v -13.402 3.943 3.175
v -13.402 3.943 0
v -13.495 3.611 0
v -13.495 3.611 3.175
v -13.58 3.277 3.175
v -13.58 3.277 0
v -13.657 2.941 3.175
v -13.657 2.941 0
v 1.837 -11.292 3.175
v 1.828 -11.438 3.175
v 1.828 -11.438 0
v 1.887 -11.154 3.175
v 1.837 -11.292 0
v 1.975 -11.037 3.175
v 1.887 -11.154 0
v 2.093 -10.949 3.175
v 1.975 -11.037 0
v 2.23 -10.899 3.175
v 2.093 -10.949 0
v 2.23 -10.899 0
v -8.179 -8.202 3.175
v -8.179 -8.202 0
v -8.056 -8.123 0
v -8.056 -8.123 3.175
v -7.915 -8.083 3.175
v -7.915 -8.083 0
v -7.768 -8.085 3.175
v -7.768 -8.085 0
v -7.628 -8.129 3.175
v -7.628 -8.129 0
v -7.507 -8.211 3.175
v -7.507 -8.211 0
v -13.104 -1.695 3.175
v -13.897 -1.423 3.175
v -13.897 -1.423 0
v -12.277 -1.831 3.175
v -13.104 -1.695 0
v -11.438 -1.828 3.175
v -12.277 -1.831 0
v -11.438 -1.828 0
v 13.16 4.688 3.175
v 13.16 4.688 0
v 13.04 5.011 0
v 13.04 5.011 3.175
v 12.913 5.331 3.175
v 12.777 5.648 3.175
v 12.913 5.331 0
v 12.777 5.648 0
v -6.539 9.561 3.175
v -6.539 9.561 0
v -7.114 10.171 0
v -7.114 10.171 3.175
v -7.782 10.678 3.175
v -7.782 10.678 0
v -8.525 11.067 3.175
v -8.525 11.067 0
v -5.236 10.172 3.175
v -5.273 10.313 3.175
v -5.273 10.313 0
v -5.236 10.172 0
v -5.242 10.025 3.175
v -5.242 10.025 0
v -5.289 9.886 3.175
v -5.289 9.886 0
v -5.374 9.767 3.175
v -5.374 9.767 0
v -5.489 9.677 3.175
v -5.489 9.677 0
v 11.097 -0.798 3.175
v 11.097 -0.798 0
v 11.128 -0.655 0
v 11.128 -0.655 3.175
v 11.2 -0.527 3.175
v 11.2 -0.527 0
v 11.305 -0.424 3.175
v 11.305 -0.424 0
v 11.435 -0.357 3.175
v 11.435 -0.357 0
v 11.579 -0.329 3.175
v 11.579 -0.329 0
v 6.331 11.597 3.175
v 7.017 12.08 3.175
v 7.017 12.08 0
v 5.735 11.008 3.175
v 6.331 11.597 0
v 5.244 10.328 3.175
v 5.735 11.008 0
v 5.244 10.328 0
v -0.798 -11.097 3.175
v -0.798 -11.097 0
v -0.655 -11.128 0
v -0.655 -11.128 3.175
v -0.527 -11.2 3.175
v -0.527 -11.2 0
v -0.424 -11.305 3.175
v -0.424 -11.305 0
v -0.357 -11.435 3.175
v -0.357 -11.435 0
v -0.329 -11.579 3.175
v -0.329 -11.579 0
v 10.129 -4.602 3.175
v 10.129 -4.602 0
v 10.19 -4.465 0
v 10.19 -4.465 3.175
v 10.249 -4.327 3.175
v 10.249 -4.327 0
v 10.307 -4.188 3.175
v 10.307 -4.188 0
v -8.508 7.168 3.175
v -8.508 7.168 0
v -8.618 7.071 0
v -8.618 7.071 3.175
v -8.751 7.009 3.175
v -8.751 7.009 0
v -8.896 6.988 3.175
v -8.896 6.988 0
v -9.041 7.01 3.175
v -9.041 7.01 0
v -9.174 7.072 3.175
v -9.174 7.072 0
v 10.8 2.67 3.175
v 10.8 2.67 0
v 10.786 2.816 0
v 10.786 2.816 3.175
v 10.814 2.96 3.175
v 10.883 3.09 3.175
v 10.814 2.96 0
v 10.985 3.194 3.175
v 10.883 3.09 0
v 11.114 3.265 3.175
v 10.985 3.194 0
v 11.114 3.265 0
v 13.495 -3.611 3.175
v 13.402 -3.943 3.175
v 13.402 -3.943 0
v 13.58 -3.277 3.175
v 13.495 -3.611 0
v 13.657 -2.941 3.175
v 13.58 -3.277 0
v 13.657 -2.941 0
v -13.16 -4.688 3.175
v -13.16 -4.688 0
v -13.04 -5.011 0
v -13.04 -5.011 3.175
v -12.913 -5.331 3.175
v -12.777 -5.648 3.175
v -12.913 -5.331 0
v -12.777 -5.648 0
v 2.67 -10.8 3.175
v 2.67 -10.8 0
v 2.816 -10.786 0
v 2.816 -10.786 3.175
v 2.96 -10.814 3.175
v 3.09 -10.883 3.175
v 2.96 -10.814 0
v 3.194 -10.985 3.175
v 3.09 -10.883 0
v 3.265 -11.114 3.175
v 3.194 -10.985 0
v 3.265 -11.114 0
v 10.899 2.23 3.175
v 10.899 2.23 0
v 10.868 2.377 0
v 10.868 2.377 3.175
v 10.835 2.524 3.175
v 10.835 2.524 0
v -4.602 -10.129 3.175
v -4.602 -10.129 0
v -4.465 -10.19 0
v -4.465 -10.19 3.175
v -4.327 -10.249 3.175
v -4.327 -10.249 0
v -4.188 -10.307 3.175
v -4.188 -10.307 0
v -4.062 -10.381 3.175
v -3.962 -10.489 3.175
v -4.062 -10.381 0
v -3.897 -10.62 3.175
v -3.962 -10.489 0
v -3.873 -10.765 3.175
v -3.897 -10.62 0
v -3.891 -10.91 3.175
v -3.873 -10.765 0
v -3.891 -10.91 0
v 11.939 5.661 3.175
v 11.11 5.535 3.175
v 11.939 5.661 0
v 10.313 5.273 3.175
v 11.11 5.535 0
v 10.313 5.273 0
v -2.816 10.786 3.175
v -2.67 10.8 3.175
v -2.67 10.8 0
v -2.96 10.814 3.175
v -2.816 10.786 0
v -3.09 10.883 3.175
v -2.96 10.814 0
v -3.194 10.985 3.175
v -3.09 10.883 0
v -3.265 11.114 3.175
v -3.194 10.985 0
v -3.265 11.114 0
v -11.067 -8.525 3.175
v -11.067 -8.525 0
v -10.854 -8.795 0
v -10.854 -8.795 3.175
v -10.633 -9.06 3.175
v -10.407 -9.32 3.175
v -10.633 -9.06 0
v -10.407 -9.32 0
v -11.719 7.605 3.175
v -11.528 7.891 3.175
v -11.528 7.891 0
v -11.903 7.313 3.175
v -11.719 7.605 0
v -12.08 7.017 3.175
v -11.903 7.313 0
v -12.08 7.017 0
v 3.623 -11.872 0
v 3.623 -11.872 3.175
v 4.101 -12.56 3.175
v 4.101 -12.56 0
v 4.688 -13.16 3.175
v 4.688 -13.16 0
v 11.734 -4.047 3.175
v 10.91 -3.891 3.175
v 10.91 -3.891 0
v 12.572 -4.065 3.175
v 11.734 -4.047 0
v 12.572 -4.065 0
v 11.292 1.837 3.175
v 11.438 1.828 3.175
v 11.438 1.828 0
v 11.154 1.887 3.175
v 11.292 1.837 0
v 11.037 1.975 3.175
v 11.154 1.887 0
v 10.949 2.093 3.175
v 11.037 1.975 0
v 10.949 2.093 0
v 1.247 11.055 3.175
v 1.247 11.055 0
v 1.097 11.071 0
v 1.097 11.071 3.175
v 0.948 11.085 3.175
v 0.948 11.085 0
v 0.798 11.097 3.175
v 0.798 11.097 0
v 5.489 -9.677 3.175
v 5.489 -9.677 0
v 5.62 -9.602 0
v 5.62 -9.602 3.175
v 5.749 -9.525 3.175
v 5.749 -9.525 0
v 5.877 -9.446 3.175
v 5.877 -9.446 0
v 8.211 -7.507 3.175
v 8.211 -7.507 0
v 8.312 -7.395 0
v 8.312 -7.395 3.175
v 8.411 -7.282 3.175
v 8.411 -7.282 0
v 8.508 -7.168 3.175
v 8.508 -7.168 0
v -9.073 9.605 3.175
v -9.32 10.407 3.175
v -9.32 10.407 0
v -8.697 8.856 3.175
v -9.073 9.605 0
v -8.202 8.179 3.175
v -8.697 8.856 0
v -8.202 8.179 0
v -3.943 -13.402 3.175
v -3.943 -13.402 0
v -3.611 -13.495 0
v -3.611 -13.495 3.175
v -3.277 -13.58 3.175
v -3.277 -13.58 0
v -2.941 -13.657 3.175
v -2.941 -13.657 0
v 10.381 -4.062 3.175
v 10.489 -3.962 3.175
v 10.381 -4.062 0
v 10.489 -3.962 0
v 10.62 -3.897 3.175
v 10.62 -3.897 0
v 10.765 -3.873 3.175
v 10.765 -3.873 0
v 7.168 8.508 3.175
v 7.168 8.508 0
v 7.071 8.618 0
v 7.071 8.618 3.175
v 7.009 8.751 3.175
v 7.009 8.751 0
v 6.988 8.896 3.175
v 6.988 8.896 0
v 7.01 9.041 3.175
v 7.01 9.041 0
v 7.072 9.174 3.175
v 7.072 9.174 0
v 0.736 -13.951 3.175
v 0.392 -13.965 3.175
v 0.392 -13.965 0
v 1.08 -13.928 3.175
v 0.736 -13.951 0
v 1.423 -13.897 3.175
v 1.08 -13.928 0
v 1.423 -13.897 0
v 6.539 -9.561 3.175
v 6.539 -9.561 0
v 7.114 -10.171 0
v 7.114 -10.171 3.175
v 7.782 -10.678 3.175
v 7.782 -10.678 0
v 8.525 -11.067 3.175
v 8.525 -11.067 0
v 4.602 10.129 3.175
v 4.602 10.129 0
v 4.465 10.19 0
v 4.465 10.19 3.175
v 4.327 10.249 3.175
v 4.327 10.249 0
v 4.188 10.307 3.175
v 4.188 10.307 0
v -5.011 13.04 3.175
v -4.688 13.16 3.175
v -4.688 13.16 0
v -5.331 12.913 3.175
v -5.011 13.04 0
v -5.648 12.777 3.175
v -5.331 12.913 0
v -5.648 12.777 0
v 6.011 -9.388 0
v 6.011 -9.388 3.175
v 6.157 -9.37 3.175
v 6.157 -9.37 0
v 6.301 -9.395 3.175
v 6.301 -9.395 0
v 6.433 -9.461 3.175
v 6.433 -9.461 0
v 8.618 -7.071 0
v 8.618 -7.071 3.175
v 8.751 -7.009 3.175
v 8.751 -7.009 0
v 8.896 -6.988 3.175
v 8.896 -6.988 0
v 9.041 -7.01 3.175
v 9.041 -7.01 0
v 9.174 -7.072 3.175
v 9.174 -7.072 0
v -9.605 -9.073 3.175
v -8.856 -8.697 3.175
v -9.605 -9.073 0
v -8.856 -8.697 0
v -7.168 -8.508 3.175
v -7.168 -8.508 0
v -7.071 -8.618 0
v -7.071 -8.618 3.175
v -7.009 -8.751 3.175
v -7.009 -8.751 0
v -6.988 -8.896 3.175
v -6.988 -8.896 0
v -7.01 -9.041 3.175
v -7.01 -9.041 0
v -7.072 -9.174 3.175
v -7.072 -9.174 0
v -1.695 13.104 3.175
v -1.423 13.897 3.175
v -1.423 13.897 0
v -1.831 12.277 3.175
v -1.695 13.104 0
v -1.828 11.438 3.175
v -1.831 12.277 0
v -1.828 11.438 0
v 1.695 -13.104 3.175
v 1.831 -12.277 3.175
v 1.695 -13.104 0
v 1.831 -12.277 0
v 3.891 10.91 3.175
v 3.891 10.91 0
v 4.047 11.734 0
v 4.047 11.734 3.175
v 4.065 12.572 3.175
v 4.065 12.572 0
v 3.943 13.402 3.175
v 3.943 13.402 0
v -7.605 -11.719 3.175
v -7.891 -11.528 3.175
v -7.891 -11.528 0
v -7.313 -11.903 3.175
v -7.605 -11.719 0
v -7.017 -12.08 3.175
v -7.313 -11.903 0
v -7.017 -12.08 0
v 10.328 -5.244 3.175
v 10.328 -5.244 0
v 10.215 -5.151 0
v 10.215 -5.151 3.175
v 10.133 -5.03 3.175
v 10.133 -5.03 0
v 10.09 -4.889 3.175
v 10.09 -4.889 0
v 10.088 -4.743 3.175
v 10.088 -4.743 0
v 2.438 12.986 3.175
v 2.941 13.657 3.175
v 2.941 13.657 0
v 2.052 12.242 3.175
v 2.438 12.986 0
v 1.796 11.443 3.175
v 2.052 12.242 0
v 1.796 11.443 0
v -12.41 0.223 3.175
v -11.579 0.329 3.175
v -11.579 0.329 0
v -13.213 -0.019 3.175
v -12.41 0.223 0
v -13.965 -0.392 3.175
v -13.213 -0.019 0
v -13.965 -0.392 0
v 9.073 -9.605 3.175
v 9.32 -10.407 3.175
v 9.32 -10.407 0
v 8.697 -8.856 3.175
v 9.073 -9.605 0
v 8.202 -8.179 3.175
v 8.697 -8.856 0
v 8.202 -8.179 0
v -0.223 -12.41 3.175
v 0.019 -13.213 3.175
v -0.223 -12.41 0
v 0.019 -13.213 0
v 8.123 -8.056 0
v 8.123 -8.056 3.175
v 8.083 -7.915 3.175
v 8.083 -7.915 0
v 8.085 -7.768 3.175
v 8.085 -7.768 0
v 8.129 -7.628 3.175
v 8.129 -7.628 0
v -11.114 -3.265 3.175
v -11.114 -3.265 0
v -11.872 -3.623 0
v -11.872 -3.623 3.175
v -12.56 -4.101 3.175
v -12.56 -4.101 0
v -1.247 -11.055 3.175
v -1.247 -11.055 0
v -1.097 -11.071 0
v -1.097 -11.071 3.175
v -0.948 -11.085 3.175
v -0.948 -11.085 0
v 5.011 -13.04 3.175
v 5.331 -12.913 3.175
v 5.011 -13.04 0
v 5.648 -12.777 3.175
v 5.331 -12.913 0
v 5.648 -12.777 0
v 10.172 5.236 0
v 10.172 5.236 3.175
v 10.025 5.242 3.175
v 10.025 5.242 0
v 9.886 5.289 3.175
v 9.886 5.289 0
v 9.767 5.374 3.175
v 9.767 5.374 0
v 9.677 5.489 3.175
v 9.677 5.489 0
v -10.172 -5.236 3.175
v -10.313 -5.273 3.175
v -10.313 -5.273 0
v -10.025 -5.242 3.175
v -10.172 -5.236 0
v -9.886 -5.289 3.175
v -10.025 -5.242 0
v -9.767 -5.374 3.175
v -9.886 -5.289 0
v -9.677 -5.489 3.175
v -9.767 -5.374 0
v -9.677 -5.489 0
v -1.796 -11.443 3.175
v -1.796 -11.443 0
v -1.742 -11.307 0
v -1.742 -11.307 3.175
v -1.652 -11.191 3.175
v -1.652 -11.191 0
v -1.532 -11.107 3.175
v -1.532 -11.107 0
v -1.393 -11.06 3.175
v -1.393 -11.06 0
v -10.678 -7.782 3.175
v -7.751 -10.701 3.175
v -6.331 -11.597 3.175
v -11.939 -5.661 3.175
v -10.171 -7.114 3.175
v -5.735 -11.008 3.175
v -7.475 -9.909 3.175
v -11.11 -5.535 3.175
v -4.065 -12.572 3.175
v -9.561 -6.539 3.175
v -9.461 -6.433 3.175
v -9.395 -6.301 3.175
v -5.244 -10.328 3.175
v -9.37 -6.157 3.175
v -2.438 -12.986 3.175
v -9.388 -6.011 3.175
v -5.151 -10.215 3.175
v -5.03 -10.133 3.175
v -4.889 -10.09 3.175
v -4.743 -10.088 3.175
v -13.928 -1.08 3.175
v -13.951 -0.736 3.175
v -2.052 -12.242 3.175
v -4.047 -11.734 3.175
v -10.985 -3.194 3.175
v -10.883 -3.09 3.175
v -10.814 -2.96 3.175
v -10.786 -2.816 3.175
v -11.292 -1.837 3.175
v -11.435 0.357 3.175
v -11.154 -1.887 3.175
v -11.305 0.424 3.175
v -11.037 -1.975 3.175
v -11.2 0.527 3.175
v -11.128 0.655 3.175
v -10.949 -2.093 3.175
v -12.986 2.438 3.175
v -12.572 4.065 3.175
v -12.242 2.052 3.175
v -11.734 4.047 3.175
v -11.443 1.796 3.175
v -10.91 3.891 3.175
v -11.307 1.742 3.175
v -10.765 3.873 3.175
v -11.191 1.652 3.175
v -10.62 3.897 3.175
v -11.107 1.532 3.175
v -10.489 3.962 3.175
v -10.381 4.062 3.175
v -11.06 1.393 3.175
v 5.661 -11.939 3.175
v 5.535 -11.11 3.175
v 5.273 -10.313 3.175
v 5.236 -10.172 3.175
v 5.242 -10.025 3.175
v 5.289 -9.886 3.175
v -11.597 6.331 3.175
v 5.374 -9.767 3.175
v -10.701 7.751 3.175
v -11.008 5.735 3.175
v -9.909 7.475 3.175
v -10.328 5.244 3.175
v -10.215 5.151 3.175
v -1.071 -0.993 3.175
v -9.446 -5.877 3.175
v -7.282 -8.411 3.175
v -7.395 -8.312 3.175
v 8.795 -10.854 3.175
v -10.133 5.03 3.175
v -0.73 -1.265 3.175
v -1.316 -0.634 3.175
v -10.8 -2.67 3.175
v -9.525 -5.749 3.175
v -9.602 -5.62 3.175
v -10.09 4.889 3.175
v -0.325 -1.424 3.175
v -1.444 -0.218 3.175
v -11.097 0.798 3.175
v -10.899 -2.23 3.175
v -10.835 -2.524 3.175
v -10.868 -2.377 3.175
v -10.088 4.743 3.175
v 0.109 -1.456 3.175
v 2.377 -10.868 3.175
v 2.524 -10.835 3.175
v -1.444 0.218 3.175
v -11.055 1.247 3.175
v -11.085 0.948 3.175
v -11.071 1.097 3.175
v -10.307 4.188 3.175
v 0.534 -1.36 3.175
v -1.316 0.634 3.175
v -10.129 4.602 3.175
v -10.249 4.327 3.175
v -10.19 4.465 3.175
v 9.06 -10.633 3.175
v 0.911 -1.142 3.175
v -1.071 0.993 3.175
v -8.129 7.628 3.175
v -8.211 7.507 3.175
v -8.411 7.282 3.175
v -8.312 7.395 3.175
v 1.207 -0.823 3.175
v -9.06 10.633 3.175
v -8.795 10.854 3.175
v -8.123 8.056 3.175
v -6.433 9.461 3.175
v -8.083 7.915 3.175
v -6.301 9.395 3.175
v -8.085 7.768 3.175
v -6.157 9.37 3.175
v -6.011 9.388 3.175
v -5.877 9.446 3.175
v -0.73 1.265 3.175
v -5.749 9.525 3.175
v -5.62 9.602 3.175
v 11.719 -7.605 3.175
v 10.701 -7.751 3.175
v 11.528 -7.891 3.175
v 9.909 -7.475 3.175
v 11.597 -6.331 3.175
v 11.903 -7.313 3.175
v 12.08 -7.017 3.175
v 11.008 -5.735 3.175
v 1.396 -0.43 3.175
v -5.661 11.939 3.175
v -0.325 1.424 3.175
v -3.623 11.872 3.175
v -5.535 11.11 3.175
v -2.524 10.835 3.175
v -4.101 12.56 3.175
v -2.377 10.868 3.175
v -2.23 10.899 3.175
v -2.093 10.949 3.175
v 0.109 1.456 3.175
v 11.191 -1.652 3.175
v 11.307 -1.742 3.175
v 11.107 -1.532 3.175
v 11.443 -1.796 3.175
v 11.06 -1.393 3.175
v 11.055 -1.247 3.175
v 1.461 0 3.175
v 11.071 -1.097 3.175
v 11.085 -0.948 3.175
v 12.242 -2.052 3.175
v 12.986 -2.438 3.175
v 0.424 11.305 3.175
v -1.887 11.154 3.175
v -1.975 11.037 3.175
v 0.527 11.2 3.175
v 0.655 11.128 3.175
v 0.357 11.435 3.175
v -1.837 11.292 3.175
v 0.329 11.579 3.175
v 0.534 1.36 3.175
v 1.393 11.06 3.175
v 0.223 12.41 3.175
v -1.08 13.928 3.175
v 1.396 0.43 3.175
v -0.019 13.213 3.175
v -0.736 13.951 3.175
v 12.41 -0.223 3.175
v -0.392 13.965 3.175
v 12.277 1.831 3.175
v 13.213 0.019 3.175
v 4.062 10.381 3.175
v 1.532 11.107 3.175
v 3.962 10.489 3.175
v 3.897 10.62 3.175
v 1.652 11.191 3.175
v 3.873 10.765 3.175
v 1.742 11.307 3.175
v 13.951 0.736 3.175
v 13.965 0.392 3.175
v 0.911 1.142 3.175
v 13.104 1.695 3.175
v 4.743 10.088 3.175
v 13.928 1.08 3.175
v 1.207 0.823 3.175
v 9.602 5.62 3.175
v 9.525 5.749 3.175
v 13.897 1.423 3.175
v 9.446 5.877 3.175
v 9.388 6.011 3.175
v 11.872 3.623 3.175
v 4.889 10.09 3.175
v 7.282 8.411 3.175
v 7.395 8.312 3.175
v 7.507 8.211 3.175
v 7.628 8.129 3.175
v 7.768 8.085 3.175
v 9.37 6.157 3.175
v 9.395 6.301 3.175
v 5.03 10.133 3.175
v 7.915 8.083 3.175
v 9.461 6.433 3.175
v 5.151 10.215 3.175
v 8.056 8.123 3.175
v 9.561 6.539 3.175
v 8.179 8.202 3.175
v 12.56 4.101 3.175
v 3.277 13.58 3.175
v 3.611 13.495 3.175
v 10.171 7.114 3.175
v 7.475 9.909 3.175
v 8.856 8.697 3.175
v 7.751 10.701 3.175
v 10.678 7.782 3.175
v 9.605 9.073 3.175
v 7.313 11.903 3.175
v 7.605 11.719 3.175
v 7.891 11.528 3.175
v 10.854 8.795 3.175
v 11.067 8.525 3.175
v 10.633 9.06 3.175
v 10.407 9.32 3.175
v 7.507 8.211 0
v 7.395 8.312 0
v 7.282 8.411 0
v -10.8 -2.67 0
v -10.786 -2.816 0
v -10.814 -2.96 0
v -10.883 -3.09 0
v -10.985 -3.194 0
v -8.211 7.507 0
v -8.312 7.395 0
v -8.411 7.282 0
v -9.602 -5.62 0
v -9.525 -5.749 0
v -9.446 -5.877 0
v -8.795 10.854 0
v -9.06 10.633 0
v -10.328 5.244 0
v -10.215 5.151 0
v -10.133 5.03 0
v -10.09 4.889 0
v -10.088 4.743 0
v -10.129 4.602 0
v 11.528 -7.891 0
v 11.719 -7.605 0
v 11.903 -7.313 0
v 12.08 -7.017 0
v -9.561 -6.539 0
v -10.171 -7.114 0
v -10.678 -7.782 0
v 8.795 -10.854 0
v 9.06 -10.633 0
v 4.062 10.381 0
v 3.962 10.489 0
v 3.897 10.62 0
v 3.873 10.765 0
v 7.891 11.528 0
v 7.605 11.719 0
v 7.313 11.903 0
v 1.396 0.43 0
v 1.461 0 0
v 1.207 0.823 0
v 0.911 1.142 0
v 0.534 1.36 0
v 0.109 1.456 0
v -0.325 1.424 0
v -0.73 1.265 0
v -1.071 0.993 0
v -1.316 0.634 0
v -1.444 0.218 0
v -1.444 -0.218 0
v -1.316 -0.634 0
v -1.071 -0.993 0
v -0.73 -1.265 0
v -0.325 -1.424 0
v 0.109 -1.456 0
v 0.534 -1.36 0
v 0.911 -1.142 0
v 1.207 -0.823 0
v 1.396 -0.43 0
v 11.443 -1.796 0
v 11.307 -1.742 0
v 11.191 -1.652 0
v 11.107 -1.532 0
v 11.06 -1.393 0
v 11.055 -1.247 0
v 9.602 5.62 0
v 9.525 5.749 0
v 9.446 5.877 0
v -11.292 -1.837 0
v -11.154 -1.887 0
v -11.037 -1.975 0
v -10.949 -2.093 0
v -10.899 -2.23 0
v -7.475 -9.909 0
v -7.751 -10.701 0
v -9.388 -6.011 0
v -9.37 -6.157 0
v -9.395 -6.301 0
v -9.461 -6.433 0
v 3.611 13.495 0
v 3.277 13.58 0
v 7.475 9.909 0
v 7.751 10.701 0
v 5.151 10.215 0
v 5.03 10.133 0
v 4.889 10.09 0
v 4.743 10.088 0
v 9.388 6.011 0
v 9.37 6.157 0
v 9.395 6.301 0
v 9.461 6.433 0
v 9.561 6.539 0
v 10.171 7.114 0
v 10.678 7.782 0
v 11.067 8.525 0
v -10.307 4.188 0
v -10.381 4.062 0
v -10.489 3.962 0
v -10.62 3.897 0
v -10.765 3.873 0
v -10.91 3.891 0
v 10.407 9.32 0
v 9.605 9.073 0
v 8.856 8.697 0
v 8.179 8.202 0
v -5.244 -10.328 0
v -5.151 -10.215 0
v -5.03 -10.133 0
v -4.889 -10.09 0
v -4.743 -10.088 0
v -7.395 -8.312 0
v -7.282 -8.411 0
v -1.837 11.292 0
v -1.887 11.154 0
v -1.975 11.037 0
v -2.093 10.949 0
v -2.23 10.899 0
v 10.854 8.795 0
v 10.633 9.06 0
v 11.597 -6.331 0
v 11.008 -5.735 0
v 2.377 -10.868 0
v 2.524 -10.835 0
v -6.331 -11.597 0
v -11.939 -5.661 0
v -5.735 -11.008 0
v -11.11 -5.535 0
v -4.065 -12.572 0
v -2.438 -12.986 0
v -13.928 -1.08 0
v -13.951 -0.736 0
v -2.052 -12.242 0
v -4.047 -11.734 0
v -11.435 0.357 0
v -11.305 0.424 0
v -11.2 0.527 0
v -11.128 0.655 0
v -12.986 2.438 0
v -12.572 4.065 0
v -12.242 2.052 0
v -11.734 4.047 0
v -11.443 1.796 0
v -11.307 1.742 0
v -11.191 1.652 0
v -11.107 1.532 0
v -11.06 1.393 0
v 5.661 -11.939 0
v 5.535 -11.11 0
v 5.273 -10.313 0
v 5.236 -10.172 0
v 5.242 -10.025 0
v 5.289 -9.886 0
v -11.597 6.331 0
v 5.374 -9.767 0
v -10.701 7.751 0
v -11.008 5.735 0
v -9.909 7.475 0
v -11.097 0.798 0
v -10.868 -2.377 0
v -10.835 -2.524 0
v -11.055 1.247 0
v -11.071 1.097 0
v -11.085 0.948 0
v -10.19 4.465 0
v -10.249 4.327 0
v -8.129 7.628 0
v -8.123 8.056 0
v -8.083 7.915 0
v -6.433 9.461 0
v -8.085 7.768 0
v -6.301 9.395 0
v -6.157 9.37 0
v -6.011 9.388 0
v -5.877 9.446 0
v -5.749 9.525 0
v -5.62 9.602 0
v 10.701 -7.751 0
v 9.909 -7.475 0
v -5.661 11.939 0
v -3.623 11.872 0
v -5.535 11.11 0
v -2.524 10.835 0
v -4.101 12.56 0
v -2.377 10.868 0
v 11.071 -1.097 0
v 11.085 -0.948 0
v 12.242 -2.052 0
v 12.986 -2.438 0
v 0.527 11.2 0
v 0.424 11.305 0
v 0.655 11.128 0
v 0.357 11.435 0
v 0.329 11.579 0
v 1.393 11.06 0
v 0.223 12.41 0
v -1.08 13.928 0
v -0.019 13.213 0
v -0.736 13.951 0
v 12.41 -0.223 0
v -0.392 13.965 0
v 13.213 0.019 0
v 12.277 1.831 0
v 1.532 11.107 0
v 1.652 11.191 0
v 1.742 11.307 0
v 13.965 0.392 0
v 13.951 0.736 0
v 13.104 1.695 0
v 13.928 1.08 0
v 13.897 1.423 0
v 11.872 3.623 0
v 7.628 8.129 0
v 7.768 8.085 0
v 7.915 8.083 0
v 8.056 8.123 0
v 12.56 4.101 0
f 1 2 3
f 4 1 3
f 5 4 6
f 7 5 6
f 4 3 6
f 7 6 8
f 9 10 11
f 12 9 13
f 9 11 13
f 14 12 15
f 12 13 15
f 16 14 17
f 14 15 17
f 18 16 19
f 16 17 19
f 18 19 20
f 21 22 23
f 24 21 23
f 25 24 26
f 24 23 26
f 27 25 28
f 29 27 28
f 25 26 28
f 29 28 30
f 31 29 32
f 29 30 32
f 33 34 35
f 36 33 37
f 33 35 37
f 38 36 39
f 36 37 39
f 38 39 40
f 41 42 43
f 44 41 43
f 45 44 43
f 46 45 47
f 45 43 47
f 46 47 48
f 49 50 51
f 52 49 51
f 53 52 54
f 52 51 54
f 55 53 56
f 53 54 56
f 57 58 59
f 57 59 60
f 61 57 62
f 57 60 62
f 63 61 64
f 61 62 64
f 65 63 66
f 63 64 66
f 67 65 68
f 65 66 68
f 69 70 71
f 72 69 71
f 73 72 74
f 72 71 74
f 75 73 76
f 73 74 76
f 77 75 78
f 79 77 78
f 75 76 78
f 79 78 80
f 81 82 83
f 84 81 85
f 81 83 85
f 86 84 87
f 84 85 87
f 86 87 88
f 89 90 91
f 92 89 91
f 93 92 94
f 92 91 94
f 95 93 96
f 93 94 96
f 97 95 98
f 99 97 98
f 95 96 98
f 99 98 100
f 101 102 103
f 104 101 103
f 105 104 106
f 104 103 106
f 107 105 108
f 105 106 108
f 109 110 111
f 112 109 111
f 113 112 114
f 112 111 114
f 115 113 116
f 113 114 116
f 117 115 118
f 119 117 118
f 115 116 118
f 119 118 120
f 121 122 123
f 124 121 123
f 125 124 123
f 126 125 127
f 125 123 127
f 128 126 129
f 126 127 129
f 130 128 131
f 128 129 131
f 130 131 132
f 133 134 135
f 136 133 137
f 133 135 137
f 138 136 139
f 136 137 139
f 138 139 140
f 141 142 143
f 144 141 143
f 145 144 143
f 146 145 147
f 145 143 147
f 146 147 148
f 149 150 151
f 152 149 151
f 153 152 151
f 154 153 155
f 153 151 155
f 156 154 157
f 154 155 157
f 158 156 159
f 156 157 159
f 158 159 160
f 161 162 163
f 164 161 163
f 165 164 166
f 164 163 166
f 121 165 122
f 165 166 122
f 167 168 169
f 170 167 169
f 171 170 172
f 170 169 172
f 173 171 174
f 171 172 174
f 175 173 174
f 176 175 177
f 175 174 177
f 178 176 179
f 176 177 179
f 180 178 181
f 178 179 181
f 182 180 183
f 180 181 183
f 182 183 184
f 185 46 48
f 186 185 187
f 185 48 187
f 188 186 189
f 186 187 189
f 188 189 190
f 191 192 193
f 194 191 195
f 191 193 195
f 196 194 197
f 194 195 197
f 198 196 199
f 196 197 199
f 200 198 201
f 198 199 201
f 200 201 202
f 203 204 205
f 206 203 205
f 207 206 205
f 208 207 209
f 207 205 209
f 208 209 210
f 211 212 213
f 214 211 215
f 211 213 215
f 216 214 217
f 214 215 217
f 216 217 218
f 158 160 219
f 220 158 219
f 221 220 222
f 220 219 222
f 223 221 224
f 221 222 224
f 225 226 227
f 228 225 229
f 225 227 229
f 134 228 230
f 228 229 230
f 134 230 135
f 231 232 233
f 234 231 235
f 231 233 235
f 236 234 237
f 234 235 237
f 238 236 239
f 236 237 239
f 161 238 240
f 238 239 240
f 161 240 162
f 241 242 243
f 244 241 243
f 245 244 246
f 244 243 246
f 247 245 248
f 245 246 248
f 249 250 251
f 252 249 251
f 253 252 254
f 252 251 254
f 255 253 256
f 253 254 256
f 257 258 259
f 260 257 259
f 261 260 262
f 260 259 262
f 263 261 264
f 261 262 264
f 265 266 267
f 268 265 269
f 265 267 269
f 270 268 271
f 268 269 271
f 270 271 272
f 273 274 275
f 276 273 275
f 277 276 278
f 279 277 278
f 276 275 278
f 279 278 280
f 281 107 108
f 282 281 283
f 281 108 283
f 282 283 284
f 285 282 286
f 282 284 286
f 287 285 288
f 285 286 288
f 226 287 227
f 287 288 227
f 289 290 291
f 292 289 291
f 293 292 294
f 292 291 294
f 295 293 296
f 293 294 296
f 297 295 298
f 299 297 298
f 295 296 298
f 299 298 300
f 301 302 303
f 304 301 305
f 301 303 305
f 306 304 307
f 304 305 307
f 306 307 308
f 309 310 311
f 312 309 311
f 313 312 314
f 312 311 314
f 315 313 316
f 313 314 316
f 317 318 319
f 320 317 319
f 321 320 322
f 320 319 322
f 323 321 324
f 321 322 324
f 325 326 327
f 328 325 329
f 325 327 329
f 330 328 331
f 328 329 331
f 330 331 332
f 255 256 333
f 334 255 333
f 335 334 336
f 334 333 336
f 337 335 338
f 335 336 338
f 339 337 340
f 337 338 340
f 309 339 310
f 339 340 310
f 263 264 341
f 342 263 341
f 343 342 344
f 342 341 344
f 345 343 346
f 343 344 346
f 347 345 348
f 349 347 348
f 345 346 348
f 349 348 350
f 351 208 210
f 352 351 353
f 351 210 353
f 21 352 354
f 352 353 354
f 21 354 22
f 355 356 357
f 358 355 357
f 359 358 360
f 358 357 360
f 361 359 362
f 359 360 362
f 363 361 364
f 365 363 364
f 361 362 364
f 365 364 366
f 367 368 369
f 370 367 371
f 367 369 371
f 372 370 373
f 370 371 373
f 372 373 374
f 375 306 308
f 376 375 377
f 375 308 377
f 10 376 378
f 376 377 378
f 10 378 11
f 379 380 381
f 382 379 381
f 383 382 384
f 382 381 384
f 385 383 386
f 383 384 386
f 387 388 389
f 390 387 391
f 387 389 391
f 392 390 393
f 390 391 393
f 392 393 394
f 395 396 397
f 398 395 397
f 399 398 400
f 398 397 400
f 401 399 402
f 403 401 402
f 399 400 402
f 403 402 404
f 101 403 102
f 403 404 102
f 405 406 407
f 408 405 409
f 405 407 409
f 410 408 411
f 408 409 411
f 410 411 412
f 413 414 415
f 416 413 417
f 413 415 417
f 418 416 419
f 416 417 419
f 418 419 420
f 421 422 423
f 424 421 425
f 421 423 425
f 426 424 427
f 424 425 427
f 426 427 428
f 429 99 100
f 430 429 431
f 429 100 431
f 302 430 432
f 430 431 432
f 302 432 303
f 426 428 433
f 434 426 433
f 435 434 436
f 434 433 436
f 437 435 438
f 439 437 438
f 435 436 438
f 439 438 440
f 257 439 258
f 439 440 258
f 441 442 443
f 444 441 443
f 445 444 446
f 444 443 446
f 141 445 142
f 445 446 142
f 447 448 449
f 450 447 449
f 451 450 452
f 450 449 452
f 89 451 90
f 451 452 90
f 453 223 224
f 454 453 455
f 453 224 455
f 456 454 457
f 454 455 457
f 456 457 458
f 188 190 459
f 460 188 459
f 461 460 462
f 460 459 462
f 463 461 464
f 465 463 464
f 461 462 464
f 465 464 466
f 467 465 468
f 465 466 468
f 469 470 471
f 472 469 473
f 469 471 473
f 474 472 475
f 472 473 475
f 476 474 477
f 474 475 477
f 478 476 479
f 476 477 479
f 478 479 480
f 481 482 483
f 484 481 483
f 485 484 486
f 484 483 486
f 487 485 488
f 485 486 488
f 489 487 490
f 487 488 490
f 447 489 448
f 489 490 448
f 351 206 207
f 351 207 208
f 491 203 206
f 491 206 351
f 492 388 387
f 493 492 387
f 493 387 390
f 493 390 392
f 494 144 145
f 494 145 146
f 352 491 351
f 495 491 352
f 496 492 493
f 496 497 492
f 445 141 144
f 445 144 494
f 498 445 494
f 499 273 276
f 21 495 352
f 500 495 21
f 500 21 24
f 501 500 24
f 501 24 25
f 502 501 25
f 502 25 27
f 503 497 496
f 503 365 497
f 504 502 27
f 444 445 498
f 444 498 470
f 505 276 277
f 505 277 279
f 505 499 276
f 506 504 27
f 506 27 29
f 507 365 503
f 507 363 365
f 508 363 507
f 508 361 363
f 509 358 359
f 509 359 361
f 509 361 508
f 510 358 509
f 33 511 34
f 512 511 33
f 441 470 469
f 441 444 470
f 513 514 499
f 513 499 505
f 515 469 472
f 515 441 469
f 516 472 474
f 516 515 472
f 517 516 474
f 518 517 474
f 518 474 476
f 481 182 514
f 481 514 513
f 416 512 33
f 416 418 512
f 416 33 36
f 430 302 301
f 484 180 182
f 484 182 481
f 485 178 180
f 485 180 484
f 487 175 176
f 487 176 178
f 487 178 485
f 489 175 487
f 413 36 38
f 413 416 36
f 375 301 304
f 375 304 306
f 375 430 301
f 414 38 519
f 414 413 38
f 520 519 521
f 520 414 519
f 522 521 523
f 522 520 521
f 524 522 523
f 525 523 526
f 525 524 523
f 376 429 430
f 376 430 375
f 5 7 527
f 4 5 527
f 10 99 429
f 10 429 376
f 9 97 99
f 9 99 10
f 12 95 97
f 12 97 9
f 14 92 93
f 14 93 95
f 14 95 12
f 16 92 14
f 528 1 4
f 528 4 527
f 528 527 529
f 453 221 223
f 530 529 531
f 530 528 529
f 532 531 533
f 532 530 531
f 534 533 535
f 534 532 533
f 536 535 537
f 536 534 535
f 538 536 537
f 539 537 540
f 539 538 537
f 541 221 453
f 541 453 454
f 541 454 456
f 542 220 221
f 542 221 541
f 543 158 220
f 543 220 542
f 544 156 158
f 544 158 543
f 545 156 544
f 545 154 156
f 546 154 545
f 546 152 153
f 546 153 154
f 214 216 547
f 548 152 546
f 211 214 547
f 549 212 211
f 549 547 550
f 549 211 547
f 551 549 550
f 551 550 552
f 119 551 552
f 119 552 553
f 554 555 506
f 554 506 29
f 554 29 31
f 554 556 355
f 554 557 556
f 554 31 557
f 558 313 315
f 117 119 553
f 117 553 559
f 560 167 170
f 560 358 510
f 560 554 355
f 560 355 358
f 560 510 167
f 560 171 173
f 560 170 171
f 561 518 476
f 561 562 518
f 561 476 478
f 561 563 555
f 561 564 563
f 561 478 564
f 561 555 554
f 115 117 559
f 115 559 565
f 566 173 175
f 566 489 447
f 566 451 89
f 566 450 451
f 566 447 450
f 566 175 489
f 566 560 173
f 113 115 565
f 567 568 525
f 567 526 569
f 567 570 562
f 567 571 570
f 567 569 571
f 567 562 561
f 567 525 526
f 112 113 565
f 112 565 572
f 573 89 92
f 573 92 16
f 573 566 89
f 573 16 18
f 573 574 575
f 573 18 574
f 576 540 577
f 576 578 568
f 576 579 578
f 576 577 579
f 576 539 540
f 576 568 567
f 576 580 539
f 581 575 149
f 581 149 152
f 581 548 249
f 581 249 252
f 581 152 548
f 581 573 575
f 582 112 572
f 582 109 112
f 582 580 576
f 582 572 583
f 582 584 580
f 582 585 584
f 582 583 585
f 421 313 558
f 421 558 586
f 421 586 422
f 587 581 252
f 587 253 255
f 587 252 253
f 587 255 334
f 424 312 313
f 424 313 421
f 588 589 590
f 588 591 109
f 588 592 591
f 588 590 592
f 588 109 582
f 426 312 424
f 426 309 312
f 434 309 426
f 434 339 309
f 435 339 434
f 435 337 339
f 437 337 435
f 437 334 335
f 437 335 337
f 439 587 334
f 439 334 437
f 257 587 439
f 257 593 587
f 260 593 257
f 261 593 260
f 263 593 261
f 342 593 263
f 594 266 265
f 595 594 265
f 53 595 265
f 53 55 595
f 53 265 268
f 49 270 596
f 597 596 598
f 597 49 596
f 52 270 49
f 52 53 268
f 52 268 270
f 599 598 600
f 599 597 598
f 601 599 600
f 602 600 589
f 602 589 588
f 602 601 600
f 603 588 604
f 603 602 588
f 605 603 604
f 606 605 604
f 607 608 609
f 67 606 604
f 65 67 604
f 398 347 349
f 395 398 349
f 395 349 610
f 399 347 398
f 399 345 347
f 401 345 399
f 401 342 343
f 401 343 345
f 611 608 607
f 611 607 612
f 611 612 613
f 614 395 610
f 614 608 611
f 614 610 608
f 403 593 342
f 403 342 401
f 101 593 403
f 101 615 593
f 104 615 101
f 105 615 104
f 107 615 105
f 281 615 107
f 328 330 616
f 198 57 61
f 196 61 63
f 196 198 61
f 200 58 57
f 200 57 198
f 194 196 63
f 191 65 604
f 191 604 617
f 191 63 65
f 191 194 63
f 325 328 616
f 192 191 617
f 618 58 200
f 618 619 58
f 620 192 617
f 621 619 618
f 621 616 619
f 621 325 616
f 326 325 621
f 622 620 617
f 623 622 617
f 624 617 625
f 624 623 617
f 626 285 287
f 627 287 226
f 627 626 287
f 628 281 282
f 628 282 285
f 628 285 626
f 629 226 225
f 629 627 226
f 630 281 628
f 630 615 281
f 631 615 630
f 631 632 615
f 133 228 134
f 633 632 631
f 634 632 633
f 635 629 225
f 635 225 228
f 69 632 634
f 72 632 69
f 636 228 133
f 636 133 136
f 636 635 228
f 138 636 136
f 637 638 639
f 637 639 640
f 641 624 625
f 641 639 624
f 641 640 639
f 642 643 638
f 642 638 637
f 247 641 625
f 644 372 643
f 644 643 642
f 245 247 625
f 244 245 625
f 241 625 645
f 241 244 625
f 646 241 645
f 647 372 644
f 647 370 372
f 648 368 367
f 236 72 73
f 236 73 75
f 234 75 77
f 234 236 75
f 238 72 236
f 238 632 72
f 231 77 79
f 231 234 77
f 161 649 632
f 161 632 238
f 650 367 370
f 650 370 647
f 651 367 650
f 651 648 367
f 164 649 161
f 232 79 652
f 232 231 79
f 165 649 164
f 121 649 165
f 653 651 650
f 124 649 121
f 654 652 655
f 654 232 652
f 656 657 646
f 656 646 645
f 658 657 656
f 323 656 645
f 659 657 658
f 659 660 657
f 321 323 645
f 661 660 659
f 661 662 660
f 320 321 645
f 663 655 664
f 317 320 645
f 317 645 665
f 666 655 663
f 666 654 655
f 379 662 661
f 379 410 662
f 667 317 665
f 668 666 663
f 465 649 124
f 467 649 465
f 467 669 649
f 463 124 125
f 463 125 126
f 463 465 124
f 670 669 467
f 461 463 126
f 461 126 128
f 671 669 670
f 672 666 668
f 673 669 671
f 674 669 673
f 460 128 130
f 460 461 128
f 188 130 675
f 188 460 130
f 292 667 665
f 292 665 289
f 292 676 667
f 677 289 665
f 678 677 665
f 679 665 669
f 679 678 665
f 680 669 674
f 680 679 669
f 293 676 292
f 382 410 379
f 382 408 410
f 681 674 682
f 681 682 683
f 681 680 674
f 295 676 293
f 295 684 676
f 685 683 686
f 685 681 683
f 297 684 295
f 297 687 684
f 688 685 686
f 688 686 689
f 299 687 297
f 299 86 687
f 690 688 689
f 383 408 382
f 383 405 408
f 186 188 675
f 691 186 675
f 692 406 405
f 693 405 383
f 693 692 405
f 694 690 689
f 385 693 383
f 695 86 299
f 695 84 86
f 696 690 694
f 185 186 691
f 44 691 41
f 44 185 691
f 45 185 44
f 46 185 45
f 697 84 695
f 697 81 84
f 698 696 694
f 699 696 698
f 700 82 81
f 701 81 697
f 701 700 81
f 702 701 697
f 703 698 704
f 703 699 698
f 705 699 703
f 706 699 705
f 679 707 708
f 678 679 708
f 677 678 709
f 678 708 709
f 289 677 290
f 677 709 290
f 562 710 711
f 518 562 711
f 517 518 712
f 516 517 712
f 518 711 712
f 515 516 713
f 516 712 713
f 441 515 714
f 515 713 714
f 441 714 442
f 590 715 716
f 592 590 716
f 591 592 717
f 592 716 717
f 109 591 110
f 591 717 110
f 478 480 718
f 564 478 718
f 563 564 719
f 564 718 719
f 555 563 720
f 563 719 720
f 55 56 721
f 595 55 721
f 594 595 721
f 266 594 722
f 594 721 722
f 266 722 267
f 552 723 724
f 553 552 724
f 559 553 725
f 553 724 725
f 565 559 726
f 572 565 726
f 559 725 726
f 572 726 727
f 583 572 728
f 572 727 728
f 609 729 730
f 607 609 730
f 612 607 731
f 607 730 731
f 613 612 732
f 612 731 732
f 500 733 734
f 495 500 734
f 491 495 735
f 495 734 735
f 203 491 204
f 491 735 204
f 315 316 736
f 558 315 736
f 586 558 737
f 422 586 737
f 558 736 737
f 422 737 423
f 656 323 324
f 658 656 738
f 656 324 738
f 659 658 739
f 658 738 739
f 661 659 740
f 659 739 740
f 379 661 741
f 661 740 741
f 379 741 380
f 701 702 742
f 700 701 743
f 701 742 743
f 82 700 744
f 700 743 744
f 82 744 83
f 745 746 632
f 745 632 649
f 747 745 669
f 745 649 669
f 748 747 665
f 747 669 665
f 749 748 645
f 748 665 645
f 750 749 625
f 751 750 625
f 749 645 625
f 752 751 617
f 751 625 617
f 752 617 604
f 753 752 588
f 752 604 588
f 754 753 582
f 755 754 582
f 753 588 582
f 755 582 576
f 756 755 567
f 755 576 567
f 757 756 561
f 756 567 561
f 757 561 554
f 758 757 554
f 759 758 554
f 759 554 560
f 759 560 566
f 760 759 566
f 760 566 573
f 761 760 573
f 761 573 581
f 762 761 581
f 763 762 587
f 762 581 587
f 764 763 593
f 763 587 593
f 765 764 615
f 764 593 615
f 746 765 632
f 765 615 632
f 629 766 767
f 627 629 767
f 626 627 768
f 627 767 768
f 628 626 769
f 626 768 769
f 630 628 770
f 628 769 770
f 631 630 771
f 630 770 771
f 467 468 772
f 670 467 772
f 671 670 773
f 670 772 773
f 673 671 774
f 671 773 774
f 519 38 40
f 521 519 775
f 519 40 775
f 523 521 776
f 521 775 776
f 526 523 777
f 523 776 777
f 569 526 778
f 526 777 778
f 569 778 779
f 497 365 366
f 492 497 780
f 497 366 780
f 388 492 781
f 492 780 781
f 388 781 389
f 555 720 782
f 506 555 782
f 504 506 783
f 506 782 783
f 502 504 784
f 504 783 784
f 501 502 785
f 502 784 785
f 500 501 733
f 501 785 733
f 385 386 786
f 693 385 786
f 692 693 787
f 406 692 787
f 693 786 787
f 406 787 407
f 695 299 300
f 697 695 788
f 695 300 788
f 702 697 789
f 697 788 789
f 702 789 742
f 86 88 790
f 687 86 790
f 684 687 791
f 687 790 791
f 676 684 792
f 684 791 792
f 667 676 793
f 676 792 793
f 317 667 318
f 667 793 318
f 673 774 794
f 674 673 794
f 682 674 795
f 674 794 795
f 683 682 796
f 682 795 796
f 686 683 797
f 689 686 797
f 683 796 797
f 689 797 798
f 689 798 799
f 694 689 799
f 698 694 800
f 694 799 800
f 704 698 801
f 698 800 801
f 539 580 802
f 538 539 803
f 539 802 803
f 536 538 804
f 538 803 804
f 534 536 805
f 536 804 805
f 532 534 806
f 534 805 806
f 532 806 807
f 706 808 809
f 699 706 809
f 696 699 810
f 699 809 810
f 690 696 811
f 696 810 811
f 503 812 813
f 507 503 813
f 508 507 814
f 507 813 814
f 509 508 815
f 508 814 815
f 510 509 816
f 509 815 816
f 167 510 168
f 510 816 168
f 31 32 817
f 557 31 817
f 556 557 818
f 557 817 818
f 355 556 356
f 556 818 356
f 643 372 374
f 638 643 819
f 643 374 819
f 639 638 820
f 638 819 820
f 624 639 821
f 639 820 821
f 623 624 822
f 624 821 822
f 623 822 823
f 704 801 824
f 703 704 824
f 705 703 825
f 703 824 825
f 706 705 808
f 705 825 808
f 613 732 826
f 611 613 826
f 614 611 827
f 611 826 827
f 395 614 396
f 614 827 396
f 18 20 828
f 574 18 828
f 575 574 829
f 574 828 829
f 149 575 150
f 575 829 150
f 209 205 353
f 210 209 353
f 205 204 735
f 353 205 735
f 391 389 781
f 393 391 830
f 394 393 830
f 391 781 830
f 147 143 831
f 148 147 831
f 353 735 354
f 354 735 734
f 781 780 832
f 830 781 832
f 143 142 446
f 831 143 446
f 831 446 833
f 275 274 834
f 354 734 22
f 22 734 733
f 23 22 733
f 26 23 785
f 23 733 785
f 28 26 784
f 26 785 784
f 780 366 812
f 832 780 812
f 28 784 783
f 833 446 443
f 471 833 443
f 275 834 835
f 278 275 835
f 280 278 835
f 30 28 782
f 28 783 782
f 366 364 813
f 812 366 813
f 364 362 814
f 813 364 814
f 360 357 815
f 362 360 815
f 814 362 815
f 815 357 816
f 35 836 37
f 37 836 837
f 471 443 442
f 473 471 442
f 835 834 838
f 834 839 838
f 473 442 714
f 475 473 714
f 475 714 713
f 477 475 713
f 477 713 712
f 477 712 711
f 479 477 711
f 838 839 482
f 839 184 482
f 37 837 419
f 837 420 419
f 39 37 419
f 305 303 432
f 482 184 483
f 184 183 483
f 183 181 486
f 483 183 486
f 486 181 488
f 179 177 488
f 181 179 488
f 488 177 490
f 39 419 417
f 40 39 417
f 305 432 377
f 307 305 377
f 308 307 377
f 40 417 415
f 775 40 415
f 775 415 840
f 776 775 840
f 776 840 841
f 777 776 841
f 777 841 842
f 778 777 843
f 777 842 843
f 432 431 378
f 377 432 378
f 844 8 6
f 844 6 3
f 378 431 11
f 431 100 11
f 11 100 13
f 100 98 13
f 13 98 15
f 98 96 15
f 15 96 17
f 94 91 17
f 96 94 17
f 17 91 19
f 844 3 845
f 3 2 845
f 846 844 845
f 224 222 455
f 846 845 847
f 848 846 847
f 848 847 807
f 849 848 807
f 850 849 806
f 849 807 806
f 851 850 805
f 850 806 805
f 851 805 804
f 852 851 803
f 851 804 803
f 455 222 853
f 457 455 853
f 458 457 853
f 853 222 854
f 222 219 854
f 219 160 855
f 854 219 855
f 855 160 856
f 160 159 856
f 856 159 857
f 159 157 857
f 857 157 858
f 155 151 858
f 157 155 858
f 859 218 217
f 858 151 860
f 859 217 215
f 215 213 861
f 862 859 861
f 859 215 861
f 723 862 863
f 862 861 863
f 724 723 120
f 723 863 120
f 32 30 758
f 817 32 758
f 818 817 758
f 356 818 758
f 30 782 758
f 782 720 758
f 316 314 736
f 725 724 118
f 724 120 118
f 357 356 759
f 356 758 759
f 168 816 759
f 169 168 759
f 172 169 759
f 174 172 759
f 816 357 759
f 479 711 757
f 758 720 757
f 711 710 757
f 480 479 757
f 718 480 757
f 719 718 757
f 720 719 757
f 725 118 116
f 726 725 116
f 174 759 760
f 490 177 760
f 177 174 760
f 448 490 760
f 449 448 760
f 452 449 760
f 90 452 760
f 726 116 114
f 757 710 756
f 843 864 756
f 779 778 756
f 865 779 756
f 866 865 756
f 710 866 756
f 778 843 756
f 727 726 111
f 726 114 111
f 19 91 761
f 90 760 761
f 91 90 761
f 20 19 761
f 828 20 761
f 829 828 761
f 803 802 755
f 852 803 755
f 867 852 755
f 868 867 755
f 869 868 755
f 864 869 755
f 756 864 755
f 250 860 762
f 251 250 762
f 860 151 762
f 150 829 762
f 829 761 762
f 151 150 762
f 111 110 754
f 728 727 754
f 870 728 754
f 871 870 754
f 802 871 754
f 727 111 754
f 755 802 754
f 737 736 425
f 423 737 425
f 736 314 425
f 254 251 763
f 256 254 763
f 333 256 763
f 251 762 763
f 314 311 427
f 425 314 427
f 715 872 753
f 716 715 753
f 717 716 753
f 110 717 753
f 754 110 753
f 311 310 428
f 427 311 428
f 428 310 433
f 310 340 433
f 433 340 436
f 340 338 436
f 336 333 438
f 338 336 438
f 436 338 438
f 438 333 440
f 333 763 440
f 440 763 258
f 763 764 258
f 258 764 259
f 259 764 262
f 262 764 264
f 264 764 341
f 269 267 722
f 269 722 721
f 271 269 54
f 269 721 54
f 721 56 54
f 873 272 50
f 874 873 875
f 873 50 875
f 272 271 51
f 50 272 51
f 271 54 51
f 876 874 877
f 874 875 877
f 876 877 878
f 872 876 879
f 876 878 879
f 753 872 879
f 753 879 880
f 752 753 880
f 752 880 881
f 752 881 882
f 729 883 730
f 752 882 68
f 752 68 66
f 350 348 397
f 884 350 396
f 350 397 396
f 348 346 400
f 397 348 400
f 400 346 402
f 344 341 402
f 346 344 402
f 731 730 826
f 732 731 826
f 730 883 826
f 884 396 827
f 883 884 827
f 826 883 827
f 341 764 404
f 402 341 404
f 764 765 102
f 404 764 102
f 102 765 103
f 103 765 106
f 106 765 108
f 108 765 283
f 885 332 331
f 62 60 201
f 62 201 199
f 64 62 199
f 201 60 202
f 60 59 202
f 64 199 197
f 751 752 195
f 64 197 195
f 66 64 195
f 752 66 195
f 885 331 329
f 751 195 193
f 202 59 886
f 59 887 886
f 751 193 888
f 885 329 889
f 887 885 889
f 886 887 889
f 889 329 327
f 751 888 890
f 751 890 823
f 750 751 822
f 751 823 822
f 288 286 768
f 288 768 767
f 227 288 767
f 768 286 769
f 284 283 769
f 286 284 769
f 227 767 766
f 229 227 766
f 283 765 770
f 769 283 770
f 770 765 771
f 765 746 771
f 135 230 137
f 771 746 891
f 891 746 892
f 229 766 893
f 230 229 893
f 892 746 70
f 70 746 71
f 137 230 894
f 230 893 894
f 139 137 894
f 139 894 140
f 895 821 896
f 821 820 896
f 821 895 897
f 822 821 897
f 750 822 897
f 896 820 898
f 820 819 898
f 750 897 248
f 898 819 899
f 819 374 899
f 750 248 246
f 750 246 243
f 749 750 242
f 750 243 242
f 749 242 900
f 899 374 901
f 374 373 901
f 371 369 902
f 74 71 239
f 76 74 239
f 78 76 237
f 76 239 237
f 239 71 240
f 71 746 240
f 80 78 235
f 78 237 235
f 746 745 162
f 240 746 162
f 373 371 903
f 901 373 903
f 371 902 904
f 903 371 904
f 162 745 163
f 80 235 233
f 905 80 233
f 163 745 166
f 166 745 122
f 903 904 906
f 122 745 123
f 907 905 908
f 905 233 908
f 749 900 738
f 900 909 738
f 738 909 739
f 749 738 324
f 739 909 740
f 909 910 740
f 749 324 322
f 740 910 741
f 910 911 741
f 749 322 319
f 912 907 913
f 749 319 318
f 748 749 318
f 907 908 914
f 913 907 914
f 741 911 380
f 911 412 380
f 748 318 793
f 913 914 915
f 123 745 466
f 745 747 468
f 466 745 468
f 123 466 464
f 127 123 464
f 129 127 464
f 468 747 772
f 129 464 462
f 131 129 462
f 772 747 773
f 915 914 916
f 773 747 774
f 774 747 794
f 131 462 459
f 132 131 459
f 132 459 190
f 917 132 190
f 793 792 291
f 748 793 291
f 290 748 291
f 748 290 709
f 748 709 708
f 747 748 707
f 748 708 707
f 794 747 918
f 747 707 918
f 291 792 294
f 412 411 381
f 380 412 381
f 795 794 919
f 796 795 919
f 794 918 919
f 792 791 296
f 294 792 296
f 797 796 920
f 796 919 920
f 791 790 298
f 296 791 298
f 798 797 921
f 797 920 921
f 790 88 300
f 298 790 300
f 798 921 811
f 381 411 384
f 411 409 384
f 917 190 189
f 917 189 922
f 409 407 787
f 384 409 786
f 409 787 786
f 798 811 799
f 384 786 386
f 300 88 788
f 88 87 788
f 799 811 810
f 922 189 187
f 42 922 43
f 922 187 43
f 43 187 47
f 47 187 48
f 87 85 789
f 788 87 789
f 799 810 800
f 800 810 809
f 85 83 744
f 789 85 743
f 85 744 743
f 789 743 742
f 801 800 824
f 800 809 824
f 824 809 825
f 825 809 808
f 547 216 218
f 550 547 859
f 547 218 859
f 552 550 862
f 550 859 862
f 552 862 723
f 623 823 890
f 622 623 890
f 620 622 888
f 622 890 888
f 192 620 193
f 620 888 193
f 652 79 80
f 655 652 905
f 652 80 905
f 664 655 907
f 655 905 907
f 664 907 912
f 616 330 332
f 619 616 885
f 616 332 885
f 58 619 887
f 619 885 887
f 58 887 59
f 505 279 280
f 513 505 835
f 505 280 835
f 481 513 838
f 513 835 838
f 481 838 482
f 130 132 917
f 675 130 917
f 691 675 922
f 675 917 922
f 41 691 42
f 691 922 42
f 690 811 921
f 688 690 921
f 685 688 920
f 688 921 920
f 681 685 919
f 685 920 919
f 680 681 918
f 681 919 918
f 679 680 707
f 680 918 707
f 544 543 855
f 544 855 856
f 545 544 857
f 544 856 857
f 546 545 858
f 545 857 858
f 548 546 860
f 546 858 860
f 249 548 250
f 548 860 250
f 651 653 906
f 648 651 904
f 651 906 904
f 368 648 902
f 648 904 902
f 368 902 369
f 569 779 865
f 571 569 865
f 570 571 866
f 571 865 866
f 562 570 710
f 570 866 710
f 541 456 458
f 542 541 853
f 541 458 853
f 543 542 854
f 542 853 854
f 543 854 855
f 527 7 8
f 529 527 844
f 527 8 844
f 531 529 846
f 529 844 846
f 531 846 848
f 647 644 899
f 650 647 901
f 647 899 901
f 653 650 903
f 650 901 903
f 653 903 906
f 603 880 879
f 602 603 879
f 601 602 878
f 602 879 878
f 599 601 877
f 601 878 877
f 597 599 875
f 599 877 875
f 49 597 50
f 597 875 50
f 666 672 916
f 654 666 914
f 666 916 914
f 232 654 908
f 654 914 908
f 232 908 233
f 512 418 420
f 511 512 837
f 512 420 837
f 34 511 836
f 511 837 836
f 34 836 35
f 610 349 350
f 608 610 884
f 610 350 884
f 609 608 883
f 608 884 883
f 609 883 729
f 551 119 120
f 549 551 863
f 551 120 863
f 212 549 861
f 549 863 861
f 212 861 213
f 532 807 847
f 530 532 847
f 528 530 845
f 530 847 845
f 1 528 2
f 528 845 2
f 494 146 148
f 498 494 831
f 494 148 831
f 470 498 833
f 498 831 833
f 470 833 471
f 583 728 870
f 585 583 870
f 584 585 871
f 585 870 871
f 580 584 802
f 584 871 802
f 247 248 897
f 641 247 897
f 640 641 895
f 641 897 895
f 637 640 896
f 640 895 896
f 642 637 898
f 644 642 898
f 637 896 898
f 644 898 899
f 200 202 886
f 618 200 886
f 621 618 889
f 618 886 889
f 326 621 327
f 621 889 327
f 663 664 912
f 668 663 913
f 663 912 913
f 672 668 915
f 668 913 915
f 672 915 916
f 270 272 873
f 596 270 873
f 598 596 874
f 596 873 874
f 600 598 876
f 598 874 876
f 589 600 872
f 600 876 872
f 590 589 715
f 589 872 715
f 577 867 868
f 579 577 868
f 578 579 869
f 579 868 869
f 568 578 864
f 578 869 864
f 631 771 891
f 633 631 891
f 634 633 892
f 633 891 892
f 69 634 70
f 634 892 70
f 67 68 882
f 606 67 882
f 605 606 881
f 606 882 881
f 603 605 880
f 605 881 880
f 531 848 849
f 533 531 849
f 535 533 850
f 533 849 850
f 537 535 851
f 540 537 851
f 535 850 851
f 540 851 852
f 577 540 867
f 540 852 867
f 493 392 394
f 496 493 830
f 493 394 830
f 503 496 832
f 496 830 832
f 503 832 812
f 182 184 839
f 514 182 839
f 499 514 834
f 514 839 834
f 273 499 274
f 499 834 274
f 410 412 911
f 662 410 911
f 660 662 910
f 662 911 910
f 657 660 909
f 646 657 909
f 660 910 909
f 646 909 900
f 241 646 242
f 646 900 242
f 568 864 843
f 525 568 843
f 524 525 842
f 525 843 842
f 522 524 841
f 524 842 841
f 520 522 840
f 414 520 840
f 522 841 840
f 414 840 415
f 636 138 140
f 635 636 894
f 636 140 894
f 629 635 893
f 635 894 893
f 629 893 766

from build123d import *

# Parameters (mm, degrees)
SKETCH3_R         = 13.97
GEARBODY_DEPTH    = 3.175
TOOTHCUT_DEPTH    = 21.010058096
CIRPATTERN1_COUNT = 20
BOREDIA_R         = 1.460500026
BORE_DEPTH        = 12700


with BuildPart() as part:
    # Sketch3 → gearBody (new body)
    with BuildSketch(Plane.XY):
        Circle(SKETCH3_R)
    extrude(amount=GEARBODY_DEPTH)

    # Sketch2 → toothCut (cut, through all)
    with BuildSketch(Plane.XY):
        with BuildLine():
            ThreePointArc((11.055114421, -1.246803989), (11.078104947, -1.022578023), (11.09654807, -0.797932304))
            ThreePointArc((11.09654807, -0.797932304), (11.248380712, -0.471754036), (11.578721183, -0.329203743))
            ThreePointArc((11.578721183, -0.329203743), (13.810169569, 0.302046563), (15.522633304, 1.865794244))
            ThreePointArc((15.522633304, 1.865794244), (15.568180658, -1.437039952), (14.918810012, -4.675728892))
            ThreePointArc((14.918810012, -4.675728892), (13.521529943, -2.824932507), (11.443338244, -1.795875603))
            ThreePointArc((11.443338244, -1.795875603), (11.144673729, -1.595264236), (11.055114421, -1.246803989))
        make_face()
    toothcut = extrude(amount=TOOTHCUT_DEPTH, mode=Mode.SUBTRACT)

    # CirPattern1: toothCut ×20 about axis
    cirpattern1_axis = Axis((0, 0, 3.175), (0, 0, -1))
    for i in range(1, CIRPATTERN1_COUNT):
        add(toothcut.rotate(cirpattern1_axis, i * 360 / CIRPATTERN1_COUNT), mode=Mode.SUBTRACT)

    # boreDia → bore (cut, symmetric)
    with BuildSketch(Plane.XY):
        Circle(BOREDIA_R)
    extrude(amount=BORE_DEPTH, both=True, mode=Mode.SUBTRACT)


solid = part.part
